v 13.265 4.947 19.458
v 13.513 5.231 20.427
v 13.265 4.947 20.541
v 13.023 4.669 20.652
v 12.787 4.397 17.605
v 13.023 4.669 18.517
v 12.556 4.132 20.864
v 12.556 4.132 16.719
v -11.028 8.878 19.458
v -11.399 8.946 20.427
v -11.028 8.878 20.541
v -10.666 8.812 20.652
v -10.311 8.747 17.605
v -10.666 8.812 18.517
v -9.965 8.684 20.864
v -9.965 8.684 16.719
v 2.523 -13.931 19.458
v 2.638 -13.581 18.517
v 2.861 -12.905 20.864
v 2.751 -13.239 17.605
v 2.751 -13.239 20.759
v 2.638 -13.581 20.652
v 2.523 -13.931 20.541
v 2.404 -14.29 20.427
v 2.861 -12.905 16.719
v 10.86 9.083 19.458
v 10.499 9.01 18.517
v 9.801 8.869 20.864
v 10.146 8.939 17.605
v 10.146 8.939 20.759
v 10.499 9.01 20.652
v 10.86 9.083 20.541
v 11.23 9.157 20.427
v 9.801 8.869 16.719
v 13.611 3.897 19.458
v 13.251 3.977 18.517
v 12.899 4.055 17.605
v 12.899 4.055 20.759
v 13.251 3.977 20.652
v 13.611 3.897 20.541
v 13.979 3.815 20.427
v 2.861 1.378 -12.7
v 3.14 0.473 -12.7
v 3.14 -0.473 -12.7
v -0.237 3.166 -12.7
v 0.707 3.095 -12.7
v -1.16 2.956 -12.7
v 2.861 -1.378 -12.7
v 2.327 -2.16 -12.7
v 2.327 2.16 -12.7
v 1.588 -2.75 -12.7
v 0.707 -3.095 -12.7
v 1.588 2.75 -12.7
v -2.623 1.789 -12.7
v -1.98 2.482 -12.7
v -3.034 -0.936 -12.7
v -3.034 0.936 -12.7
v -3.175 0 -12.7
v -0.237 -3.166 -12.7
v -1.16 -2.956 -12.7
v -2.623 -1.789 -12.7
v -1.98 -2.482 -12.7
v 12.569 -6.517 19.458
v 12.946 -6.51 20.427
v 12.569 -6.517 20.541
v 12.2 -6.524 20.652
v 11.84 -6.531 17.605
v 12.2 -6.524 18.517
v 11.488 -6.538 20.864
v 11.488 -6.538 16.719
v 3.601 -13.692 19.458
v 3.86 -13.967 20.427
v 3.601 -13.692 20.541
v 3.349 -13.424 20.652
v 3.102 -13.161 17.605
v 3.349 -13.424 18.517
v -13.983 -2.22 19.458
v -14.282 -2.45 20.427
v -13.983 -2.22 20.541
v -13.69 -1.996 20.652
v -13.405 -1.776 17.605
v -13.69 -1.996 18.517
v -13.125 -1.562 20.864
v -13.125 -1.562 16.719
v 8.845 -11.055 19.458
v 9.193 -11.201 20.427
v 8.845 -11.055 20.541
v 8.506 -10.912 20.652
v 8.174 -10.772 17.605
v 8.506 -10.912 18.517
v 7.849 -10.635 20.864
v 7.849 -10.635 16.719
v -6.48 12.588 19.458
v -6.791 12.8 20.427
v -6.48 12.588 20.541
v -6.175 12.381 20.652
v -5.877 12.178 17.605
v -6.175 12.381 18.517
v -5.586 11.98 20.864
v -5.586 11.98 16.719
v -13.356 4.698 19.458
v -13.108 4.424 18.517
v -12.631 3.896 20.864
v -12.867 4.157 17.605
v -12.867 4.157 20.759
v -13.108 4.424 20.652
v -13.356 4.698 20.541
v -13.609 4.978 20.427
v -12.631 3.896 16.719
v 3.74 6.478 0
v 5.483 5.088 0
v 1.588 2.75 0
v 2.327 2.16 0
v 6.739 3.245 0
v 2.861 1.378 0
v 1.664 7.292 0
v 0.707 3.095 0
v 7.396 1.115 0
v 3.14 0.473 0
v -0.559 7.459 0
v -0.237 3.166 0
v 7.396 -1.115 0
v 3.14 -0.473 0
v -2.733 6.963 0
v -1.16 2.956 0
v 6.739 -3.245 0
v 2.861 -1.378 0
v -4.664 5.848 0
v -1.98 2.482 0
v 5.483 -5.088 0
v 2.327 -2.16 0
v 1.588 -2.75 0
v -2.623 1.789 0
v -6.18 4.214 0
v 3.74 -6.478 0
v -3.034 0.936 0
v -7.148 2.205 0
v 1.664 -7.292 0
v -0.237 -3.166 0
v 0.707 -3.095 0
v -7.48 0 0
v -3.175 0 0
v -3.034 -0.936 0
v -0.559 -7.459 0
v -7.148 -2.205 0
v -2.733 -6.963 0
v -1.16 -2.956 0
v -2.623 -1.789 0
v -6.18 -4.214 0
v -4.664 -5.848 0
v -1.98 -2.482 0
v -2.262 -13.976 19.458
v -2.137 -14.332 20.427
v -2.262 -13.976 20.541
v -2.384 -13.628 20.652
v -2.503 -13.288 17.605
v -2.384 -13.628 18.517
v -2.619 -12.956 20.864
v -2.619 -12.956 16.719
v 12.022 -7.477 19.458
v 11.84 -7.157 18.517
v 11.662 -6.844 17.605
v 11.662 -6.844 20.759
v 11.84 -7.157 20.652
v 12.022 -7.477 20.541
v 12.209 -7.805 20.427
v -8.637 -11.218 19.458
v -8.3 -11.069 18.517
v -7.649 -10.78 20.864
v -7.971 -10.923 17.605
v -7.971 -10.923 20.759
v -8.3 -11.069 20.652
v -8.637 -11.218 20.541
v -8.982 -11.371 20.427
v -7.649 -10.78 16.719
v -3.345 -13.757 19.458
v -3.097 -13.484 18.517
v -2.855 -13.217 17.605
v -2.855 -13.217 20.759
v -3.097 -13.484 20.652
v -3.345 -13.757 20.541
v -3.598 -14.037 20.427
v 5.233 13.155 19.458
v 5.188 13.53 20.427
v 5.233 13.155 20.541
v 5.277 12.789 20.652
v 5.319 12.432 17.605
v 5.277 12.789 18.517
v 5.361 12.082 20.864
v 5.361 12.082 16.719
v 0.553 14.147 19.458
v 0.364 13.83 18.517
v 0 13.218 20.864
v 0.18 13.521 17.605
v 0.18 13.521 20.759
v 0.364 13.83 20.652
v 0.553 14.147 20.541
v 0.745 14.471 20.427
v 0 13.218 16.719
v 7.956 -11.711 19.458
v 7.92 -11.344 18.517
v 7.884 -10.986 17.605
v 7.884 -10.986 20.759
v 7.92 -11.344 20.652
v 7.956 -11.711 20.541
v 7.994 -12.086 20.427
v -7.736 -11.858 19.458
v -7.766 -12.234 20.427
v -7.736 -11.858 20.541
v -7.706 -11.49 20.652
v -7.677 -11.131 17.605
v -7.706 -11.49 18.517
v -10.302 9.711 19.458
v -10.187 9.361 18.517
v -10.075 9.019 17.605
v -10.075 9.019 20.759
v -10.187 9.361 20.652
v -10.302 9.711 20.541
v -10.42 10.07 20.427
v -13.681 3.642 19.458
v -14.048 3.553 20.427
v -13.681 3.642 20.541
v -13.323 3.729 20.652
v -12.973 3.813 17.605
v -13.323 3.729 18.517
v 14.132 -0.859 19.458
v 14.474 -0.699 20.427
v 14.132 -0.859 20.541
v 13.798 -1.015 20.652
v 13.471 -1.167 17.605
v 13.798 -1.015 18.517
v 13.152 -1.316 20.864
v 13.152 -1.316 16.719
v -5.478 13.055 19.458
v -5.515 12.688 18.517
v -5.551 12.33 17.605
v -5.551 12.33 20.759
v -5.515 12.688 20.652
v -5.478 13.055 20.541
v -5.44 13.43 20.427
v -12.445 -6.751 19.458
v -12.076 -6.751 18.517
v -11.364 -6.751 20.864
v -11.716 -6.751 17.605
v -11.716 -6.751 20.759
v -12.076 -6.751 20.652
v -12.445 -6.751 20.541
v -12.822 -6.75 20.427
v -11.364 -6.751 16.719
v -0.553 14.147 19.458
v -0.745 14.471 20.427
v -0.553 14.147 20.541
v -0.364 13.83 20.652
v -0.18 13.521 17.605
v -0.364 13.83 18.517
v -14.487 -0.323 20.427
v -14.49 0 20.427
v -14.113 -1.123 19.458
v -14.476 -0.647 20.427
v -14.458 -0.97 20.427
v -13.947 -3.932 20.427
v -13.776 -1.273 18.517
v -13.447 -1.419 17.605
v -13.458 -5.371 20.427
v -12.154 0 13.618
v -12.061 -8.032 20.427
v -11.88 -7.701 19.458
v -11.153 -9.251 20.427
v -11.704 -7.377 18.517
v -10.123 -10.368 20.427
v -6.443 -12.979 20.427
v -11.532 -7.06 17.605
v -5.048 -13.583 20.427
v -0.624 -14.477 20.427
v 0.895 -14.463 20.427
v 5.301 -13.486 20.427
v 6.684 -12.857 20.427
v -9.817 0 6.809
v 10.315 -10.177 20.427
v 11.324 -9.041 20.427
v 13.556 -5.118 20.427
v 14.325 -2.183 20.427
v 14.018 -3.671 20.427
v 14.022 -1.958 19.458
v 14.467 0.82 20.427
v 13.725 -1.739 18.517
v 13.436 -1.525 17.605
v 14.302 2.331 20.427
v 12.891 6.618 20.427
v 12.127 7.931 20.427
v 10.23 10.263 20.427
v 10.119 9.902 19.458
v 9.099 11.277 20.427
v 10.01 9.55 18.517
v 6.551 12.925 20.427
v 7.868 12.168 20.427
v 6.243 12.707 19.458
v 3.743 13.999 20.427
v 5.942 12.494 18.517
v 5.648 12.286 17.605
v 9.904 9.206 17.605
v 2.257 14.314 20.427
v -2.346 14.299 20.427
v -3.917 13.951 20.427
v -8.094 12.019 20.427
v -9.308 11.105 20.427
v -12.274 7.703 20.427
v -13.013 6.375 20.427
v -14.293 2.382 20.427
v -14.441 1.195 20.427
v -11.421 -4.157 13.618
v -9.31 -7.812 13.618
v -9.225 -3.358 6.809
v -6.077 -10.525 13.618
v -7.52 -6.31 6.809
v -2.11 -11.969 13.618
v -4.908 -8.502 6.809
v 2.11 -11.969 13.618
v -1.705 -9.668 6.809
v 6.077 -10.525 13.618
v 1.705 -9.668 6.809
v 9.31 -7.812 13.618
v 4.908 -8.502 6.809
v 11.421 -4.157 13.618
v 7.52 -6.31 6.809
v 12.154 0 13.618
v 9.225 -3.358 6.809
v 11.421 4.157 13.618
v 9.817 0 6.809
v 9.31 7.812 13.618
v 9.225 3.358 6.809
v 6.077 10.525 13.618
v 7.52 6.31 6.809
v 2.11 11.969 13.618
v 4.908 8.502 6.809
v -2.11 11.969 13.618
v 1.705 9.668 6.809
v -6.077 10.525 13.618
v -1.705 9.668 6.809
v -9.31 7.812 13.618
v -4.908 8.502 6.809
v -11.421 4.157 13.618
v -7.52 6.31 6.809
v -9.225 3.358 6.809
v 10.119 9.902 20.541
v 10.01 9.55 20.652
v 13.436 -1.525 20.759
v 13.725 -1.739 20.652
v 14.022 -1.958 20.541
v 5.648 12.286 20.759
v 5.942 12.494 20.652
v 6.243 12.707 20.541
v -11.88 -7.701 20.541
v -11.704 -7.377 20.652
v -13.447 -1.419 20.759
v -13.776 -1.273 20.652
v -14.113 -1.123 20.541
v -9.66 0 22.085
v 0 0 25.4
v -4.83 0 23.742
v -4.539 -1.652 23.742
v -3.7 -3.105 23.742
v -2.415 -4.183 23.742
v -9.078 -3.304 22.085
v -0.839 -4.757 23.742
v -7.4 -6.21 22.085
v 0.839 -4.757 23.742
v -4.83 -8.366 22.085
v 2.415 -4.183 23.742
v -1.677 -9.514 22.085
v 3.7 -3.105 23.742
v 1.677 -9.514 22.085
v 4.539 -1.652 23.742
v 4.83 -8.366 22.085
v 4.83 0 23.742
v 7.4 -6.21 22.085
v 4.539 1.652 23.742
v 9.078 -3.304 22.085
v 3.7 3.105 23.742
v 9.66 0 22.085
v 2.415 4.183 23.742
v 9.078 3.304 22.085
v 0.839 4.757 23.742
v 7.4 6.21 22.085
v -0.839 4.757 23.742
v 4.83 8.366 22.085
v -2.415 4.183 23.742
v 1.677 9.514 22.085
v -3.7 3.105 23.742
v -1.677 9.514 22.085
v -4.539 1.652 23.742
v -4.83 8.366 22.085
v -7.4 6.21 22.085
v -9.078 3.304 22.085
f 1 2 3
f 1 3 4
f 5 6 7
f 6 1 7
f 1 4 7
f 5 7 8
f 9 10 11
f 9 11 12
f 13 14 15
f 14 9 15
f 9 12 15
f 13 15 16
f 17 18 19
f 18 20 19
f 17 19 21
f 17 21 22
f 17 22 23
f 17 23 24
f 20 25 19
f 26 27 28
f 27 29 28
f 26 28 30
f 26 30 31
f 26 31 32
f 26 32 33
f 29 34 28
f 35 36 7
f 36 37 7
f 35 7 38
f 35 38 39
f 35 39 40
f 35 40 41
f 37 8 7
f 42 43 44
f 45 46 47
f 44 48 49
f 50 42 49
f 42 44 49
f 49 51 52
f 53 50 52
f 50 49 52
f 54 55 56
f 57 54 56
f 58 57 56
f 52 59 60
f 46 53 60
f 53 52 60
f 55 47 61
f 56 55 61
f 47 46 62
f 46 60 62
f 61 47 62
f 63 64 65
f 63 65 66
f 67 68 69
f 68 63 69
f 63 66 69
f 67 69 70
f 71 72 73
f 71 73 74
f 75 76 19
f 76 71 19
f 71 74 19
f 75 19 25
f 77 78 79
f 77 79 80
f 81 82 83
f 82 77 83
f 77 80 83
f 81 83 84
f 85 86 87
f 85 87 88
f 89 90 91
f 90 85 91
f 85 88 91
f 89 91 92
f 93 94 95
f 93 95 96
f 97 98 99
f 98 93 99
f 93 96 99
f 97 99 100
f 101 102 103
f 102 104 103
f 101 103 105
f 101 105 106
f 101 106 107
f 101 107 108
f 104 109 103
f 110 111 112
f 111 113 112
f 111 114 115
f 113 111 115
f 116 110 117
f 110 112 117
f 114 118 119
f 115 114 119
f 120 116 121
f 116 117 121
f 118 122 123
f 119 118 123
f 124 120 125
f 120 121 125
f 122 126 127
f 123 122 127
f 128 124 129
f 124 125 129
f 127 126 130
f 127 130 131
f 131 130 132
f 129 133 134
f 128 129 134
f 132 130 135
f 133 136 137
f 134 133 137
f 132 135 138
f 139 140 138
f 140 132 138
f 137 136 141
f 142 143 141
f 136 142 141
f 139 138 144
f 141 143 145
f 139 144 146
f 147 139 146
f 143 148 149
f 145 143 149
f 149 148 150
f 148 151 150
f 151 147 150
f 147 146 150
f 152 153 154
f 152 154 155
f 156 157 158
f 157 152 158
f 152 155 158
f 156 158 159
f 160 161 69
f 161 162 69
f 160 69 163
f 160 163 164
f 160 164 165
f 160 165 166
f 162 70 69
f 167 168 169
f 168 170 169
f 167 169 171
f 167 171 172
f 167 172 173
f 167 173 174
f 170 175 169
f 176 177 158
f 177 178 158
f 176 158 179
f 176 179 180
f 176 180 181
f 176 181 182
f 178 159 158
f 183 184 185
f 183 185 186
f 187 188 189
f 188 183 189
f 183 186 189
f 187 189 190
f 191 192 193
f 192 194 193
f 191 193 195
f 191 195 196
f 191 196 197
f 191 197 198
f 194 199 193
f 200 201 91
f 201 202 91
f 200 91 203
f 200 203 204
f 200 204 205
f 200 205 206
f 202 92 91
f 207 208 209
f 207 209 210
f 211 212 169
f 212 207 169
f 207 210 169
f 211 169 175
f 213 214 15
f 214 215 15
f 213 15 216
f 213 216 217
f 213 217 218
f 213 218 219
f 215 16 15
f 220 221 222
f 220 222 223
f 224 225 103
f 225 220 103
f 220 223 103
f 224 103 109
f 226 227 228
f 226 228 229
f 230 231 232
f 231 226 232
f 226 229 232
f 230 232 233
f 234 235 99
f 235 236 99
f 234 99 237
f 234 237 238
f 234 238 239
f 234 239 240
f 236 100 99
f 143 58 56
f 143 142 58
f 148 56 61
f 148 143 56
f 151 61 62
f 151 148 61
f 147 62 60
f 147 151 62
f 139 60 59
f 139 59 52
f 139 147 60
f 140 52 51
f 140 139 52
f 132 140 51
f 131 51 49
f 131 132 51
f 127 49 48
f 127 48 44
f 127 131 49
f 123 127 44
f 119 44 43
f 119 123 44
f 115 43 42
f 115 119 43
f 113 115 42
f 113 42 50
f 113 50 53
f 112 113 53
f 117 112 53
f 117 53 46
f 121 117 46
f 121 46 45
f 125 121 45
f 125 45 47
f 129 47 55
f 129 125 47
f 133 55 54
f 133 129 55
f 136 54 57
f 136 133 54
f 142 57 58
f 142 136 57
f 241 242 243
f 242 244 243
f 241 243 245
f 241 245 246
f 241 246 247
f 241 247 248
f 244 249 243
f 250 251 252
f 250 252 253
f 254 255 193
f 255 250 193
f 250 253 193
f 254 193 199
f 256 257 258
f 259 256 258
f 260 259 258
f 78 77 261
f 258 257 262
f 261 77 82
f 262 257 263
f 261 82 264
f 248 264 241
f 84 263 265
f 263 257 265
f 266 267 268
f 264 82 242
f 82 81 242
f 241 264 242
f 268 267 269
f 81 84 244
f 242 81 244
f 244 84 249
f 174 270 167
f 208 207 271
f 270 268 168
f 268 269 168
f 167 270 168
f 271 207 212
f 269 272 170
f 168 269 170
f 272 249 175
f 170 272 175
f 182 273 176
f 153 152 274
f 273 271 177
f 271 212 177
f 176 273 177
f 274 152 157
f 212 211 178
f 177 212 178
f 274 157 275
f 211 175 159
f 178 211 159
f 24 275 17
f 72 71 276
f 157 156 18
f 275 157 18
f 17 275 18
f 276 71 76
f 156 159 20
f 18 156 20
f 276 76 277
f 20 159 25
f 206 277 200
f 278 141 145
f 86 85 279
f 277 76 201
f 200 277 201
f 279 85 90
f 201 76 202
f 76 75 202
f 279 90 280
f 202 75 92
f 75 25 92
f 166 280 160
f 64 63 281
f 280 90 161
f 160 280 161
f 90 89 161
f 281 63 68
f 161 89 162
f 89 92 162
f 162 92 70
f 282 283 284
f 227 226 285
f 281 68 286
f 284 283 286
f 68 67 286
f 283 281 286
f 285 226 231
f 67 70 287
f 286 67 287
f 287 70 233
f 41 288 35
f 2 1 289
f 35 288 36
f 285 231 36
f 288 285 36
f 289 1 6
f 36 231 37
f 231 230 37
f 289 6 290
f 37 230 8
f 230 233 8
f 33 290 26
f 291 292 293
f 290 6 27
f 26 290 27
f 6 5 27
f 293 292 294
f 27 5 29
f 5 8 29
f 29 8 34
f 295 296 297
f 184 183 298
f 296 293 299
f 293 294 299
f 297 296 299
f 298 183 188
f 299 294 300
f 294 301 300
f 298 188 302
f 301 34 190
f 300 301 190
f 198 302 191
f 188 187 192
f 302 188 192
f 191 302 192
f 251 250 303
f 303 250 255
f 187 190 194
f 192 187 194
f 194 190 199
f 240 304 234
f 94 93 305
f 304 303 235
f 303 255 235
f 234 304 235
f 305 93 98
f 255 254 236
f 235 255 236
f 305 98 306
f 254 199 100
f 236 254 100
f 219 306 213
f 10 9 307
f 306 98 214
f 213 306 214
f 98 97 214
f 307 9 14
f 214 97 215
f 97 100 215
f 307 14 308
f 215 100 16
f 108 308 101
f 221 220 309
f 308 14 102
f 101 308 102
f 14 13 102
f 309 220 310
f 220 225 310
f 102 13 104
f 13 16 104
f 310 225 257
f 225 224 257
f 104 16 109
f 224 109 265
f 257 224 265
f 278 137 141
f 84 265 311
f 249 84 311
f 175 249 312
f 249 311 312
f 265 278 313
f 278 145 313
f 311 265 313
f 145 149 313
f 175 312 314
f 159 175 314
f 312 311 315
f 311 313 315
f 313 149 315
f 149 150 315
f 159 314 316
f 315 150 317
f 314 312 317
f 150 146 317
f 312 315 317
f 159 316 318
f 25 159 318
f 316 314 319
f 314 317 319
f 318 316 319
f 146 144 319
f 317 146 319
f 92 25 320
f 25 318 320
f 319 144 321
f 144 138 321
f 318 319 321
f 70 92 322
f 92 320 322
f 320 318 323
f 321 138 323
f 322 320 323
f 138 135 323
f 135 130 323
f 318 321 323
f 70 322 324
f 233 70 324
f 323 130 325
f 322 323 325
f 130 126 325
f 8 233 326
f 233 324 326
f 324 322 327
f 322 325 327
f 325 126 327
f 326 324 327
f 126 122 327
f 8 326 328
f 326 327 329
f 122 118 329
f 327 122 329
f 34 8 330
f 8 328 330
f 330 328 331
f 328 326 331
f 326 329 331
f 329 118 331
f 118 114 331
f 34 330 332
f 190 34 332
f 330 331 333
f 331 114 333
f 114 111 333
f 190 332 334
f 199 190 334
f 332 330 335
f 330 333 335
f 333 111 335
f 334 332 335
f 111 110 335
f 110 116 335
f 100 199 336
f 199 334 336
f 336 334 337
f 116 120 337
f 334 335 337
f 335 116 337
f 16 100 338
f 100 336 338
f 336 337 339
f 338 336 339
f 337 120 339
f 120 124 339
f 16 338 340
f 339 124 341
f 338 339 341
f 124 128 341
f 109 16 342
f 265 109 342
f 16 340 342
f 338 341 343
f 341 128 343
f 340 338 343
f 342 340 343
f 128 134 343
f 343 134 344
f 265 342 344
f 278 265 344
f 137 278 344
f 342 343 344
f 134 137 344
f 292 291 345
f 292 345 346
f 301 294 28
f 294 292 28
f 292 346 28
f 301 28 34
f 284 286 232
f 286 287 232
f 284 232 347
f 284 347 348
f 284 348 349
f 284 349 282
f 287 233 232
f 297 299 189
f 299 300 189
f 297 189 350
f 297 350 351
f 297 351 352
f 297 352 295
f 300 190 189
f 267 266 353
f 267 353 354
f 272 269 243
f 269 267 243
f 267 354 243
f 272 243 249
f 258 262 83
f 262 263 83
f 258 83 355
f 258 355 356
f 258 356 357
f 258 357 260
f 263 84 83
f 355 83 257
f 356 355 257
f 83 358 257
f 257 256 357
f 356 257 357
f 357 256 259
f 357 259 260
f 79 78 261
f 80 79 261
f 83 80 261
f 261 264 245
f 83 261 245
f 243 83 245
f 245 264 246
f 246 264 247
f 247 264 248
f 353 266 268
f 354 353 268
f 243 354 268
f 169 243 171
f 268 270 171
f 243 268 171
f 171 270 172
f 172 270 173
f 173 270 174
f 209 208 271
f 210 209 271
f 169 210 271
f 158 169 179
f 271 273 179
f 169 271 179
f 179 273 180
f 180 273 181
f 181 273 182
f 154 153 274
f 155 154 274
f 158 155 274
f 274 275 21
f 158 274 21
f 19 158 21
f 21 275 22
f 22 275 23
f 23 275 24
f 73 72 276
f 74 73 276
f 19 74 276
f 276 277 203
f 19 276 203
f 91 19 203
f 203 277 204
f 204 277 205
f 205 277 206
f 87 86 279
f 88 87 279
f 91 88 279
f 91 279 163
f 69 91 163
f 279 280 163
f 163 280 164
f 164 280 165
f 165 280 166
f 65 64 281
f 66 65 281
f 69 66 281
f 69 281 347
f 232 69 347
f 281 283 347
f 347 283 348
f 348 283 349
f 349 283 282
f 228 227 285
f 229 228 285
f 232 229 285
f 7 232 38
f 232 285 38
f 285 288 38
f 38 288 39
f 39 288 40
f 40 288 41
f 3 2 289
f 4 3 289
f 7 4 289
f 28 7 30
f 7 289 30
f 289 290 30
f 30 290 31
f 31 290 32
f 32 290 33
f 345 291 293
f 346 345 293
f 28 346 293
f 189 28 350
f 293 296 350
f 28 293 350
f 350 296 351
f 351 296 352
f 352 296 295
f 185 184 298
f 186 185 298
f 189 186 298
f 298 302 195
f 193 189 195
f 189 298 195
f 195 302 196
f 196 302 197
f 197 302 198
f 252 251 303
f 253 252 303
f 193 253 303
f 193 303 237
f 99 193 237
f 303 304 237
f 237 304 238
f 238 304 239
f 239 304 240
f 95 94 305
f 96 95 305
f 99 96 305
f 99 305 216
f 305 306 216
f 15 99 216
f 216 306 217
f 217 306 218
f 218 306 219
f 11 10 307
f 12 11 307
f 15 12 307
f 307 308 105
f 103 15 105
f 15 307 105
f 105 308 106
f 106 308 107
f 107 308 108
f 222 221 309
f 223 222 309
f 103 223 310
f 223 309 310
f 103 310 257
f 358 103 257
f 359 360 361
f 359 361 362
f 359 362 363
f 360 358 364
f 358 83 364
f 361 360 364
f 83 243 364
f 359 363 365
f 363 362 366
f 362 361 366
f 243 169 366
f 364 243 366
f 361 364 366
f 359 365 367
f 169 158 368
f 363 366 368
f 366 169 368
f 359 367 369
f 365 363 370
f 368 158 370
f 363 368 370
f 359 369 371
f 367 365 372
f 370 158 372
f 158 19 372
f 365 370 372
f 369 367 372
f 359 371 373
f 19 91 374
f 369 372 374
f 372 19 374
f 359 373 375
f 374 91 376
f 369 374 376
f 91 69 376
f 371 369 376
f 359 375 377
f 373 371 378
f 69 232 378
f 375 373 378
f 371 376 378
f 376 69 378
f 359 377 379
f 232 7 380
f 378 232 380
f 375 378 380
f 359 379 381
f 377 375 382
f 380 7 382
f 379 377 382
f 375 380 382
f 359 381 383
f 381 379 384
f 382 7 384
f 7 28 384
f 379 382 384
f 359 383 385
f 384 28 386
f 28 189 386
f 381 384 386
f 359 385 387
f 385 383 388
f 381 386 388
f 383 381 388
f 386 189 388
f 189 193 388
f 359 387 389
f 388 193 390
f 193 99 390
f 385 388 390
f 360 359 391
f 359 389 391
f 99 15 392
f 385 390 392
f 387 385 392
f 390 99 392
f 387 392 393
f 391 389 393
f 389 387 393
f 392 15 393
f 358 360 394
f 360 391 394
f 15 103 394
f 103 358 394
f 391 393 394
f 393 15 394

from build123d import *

# Parameters (mm, degrees)
F0_W     = 3.175
F0_H     = 12.7
F4_DEPTH = 25.4


with BuildPart() as f1:
    # F0 (on Front) → F1 (revolve)
    with BuildSketch(Plane.XZ):
        Polygon((-3.175, 0), (0, 0), (0, 25.4), (-14.490464, 20.426942), (-7.480035, 0), align=None)
        with Locations((-1.5875, -6.35)):
            Rectangle(F0_W, F0_H)
    revolve(axis=Axis((0, 0, 12.7), (0, 0, 1)))

    # F3 (on offset) → F4 (cut)
    with BuildSketch(Plane.XY.offset(25.4)):
        Polygon((-2.321808, 17.121961), (0, 13.217989), (2.321808, 17.121961), align=None)
        Polygon((5.361183, 12.081927), (9.066876, 14.70864), (4.822371, 16.592079), align=None)
        Polygon((9.800797, 8.869025), (14.253382, 9.766958), (11.137602, 13.210079), align=None)
        Polygon((12.555691, 4.13157), (16.989782, 3.14637), (15.538319, 7.557313), align=None)
        Polygon((13.152306, -1.316087), (16.805701, -4.015067), (17.268056, 0.605473), align=None)
        Polygon((11.488088, -6.537513), (13.732781, -10.486329), (16.029476, -6.450445), align=None)
        Polygon((7.849109, -10.635165), (8.299245, -15.155028), (12.035488, -12.397556), align=None)
        Polygon((2.860897, -12.90467), (1.439099, -17.218634), (5.972642, -16.213571), align=None)
        Polygon((-2.619094, -12.95591), (-5.668423, -16.322418), (-1.116878, -17.242533), align=None)
        Polygon((-7.648871, -10.780075), (-11.801563, -12.620438), (-8.014412, -15.307565), align=None)
        Polygon((-11.363835, -6.751184), (-15.906058, -6.74905), (-13.534297, -10.741283), align=None)
        Polygon((-13.125397, -1.56179), (-17.276358, 0.282475), (-16.727686, -4.328613), align=None)
        Polygon((-12.630751, 3.896071), (-15.676916, 7.265443), (-17.045646, 2.82813), align=None)
        Polygon((-9.964925, 8.684211), (-11.382668, 12.999508), (-14.433521, 9.498728), align=None)
        Polygon((-5.586164, 11.979567), (-5.131781, 16.499005), (-9.340326, 14.536528), align=None)
    extrude(amount=-F4_DEPTH, mode=Mode.SUBTRACT)


solid = f1.part
